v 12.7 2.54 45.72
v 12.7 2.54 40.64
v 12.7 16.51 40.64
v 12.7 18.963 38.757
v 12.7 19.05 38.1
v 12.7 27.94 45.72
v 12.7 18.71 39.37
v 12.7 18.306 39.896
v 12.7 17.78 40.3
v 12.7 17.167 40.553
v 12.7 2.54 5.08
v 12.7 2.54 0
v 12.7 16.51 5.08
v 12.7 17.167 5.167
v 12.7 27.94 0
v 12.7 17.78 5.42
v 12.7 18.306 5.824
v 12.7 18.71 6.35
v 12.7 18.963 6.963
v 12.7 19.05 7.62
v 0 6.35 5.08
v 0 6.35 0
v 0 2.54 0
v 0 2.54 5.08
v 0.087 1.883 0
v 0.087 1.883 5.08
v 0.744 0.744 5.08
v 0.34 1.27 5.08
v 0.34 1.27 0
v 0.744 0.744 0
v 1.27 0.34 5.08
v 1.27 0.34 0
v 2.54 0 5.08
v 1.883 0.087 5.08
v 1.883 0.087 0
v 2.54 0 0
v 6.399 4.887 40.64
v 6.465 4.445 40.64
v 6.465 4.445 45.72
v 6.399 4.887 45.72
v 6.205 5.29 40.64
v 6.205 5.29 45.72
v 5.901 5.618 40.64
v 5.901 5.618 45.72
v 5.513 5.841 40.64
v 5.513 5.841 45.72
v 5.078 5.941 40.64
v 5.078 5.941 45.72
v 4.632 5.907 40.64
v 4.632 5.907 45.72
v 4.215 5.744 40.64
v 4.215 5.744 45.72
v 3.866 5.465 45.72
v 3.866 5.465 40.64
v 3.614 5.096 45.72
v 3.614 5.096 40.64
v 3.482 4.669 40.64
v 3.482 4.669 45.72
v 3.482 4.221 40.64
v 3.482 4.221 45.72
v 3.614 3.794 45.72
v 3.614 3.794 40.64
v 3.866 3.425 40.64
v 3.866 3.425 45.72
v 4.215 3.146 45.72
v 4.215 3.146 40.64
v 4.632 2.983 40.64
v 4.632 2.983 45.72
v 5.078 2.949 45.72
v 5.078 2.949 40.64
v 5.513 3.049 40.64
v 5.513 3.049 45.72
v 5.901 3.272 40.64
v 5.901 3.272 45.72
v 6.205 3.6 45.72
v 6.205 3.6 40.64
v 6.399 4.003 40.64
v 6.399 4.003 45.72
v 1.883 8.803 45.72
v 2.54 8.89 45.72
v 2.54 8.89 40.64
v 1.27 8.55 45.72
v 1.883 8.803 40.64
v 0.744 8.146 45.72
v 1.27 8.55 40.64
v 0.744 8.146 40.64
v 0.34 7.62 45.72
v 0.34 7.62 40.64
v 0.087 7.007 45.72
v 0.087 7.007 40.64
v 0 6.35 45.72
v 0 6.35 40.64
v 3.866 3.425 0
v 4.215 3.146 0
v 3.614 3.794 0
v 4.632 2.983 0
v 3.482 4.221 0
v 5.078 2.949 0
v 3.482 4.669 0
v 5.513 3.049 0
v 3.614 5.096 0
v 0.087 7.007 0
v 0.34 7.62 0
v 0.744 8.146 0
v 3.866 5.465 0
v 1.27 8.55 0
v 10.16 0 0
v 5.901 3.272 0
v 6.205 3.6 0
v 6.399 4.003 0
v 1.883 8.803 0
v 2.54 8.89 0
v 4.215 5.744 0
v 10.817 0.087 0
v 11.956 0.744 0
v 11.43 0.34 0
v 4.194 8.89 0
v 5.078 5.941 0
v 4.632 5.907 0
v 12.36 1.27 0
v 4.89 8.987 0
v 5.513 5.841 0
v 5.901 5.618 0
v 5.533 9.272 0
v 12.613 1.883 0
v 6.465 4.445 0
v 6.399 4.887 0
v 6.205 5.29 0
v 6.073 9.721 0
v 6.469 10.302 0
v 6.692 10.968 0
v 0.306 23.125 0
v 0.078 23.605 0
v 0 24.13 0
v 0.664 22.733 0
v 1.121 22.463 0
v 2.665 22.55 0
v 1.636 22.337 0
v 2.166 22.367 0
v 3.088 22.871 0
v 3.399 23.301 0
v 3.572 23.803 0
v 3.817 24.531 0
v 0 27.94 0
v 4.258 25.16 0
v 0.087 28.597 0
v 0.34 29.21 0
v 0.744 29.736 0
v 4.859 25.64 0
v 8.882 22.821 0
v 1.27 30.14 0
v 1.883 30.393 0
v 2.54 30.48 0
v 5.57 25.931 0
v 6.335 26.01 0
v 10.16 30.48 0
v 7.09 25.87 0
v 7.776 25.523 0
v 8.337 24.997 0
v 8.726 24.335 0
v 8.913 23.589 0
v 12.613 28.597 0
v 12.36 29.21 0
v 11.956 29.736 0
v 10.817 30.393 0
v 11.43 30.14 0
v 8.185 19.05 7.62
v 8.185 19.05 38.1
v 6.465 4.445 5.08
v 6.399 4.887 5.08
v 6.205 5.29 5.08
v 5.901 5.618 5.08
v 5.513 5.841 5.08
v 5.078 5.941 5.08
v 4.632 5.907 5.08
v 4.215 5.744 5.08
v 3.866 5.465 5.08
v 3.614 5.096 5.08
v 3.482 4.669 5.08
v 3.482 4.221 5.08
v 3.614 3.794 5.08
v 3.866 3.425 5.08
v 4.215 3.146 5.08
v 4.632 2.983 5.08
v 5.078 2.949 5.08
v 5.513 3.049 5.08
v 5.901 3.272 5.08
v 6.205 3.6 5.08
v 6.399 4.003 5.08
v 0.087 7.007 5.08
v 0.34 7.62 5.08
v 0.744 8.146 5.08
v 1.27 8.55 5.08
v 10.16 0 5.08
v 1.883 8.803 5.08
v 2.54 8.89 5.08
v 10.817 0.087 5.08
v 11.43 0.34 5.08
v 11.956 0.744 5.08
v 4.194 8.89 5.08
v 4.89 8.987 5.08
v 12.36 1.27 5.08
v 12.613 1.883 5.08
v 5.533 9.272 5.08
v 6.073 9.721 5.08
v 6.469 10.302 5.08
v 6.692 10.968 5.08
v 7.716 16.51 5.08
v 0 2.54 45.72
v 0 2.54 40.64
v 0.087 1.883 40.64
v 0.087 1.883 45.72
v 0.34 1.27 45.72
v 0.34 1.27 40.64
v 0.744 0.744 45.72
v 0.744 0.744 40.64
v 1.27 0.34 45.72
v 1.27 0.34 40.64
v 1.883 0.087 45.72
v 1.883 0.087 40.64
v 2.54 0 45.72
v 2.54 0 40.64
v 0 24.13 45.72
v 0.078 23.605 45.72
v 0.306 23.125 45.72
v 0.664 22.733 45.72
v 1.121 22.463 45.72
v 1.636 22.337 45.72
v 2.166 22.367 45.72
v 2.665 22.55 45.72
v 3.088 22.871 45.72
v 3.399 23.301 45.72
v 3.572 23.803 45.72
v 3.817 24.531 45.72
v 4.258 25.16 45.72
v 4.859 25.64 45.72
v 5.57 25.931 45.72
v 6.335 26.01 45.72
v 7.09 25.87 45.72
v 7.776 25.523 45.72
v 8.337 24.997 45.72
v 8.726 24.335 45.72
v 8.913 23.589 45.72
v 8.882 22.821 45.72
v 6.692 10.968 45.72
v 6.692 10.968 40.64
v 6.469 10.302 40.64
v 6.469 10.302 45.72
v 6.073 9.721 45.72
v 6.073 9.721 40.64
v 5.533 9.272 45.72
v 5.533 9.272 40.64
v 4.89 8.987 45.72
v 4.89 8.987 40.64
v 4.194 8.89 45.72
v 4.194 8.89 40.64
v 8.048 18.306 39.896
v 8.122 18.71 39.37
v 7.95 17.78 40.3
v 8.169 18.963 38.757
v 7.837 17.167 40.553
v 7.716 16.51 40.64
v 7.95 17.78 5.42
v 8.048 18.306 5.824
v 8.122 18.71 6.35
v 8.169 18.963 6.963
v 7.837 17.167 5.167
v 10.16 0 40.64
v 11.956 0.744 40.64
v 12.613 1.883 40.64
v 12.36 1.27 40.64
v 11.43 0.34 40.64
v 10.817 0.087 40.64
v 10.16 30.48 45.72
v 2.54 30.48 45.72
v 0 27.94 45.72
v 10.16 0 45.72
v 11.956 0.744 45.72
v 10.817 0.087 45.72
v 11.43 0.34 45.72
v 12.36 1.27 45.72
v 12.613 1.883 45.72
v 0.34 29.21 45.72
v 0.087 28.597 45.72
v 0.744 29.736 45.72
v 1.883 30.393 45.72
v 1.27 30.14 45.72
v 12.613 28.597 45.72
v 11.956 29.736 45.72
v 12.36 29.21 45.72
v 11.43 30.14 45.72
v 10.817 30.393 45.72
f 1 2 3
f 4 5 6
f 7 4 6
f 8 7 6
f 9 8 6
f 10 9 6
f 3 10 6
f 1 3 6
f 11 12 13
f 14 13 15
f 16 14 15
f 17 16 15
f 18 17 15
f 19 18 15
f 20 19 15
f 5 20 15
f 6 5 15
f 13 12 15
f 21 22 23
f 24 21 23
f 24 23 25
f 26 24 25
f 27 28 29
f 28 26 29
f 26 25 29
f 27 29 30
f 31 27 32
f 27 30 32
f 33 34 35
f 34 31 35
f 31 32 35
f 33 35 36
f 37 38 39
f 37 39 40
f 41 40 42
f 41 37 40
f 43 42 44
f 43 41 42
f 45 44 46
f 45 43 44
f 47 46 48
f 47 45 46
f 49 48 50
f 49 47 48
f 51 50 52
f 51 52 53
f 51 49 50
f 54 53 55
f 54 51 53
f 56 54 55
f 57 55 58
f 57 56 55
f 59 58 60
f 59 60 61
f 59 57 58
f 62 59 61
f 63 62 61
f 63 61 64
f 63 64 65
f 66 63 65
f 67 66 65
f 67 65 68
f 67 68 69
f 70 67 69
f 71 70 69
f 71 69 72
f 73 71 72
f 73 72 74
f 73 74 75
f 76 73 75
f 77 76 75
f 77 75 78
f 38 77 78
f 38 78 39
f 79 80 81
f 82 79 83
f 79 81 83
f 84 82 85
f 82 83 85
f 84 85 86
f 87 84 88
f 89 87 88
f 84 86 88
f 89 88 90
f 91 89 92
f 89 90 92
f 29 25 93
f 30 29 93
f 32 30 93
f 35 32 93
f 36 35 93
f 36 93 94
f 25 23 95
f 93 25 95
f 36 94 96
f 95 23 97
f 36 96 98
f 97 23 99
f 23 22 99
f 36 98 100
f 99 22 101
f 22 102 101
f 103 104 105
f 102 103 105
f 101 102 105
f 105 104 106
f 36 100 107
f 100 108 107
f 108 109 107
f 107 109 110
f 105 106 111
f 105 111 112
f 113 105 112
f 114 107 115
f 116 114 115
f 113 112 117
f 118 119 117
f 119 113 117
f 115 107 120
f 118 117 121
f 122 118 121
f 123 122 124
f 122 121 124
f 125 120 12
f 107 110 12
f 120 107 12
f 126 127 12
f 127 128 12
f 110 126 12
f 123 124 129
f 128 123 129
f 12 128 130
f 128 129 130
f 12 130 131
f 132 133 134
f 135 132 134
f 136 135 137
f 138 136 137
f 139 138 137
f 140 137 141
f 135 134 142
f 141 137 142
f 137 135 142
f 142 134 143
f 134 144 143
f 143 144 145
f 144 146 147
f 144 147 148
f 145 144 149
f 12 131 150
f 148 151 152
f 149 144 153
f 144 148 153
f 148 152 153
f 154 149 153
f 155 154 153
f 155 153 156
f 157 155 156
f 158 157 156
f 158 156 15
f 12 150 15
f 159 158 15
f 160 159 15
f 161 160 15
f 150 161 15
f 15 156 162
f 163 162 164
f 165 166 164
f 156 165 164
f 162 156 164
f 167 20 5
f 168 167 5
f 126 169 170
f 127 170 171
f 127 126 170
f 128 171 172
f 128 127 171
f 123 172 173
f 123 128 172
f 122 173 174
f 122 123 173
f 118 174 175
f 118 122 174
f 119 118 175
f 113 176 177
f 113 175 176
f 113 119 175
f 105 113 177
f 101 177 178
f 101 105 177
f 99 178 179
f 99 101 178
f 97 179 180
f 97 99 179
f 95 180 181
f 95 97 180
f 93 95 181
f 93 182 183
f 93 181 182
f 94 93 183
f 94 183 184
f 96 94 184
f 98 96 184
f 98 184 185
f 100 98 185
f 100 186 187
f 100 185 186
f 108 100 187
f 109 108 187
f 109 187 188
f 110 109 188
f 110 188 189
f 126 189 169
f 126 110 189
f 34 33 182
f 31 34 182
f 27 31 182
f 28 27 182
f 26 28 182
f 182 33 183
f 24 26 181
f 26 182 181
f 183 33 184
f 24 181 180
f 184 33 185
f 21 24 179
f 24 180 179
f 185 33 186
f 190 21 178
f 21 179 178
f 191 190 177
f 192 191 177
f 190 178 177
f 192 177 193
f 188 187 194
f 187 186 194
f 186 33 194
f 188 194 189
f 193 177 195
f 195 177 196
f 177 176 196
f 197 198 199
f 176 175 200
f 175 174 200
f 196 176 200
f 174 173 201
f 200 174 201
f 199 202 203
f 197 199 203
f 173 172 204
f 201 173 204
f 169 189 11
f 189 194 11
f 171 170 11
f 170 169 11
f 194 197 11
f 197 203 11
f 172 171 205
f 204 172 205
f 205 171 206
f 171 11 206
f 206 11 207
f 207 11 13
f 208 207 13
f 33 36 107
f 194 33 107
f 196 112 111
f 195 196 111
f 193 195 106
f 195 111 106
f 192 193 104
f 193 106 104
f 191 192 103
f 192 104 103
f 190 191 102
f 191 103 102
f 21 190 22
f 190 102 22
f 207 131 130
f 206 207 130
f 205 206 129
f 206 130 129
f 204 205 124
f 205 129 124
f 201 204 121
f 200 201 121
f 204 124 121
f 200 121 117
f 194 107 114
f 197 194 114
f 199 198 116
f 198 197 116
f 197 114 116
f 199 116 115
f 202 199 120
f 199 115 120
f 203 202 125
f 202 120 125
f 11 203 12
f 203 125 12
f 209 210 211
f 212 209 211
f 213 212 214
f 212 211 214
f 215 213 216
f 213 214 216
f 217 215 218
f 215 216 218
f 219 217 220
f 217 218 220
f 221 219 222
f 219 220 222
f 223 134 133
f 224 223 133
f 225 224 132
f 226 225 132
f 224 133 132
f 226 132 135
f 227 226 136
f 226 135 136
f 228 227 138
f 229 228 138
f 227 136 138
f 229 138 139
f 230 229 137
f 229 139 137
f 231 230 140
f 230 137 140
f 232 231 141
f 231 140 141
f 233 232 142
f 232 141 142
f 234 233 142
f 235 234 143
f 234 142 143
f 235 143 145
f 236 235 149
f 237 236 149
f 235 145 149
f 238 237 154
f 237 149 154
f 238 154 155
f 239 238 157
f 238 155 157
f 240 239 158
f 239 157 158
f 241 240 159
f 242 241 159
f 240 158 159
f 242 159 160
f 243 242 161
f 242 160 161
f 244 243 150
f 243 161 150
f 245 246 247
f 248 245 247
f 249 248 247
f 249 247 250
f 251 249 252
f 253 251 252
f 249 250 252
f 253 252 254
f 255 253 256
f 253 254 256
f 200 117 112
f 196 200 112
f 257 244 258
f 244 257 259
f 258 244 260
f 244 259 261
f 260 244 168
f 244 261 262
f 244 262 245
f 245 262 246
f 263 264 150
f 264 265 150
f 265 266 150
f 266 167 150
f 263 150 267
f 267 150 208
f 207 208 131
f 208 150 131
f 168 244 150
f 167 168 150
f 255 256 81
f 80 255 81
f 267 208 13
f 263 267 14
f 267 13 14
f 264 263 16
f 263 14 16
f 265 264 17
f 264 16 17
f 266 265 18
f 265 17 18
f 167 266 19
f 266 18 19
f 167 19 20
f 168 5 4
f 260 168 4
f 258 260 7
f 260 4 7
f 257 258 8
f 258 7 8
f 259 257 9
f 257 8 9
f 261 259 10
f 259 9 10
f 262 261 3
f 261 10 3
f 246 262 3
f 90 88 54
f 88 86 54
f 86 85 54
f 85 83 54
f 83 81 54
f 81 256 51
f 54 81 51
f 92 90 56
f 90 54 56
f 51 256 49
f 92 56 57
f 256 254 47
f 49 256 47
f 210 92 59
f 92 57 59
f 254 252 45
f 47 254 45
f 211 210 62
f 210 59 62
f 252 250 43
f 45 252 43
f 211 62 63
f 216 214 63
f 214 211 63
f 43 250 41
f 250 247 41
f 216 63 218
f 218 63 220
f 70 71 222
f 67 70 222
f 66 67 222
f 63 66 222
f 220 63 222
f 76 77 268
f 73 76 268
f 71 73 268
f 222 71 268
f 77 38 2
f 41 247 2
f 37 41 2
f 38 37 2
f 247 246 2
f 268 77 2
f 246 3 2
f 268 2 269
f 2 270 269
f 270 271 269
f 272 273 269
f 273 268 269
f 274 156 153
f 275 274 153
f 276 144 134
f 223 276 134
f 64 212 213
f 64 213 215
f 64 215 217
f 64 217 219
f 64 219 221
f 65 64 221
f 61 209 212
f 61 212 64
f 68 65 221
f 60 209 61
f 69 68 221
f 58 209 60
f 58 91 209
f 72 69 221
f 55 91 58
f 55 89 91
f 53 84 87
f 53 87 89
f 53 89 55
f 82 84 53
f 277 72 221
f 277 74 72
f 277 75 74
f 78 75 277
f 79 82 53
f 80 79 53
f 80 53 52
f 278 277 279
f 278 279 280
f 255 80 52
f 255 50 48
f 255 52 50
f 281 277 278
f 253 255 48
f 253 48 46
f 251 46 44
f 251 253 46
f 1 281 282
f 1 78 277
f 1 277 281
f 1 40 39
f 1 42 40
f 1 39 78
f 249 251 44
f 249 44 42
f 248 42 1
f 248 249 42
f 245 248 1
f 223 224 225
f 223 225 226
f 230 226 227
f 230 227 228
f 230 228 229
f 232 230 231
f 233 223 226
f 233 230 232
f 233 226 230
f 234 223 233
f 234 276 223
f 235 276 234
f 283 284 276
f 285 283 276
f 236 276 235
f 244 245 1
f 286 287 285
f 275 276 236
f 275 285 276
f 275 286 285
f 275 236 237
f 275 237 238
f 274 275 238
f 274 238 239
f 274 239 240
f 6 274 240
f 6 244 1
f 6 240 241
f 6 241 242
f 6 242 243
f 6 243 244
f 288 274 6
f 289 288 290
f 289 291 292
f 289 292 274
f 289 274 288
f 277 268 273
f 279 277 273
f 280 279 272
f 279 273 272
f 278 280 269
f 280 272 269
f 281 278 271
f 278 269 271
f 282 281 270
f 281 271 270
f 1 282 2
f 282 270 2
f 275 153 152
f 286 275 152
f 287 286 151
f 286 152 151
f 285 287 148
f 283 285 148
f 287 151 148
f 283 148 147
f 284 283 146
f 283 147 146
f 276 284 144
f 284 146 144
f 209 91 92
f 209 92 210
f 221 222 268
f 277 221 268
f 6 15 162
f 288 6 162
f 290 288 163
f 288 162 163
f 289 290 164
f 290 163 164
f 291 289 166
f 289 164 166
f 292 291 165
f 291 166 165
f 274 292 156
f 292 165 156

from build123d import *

# Parameters (mm, degrees)
SKETCH1_R           = 1.5
BOSS_EXTRUDE1_DEPTH = 45.72
CUT_EXTRUDE1_DEPTH  = 25.4


with BuildPart() as part:
    # Sketch1 → Boss-Extrude1 (new body)
    with BuildSketch(Plane.XY):
        with BuildLine():
            Line((8.882163561, 22.821280576), (6.691616477, 10.968396178))
            ThreePointArc((6.691616477, 10.968396178), (5.818586392, 9.477556184), (4.19391315, 8.89))
            Line((4.19391315, 8.89), (2.54, 8.89))
            ThreePointArc((2.54, 8.89), (0.743948776, 8.146051224), (0, 6.35))
            Line((0, 6.35), (0, 2.54))
            ThreePointArc((0, 2.54), (0.743948776, 0.743948776), (2.54, 0))
            Line((2.54, 0), (10.16, 0))
            ThreePointArc((10.16, 0), (11.956051224, 0.743948776), (12.7, 2.54))
            Line((12.7, 2.54), (12.7, 27.94))
            ThreePointArc((12.7, 27.94), (11.956051224, 29.736051224), (10.16, 30.48))
            Line((10.16, 30.48), (2.54, 30.48))
            ThreePointArc((2.54, 30.48), (0.743948776, 29.736051224), (0, 27.94))
            Line((0, 27.94), (0, 24.13))
            ThreePointArc((0, 24.13), (1.636464911, 22.336730574), (3.571576672, 23.802737092))
            ThreePointArc((3.571576672, 23.802737092), (6.717598374, 25.967302278), (8.882163561, 22.821280576))
        make_face()
        with Locations((4.965459901, 4.445)):
            Circle(SKETCH1_R, mode=Mode.SUBTRACT)
    extrude(amount=BOSS_EXTRUDE1_DEPTH)

    # Sketch2 → Cut-Extrude1 (cut)
    with BuildSketch(Plane(origin=(12.7, 0, 0), x_dir=(0, 0, -1), z_dir=(1, 0, 0))):
        with BuildLine():
            Line((-40.64, 0), (-5.08, 0))
            Line((-5.08, 0), (-5.08, 16.51))
            ThreePointArc((-5.08, 16.51), (-5.823948776, 18.306051224), (-7.62, 19.05))
            Line((-7.62, 19.05), (-38.1, 19.05))
            ThreePointArc((-38.1, 19.05), (-39.896051224, 18.306051224), (-40.64, 16.51))
            Line((-40.64, 16.51), (-40.64, 0))
        make_face()
    extrude(amount=-CUT_EXTRUDE1_DEPTH, mode=Mode.SUBTRACT)


solid = part.part
